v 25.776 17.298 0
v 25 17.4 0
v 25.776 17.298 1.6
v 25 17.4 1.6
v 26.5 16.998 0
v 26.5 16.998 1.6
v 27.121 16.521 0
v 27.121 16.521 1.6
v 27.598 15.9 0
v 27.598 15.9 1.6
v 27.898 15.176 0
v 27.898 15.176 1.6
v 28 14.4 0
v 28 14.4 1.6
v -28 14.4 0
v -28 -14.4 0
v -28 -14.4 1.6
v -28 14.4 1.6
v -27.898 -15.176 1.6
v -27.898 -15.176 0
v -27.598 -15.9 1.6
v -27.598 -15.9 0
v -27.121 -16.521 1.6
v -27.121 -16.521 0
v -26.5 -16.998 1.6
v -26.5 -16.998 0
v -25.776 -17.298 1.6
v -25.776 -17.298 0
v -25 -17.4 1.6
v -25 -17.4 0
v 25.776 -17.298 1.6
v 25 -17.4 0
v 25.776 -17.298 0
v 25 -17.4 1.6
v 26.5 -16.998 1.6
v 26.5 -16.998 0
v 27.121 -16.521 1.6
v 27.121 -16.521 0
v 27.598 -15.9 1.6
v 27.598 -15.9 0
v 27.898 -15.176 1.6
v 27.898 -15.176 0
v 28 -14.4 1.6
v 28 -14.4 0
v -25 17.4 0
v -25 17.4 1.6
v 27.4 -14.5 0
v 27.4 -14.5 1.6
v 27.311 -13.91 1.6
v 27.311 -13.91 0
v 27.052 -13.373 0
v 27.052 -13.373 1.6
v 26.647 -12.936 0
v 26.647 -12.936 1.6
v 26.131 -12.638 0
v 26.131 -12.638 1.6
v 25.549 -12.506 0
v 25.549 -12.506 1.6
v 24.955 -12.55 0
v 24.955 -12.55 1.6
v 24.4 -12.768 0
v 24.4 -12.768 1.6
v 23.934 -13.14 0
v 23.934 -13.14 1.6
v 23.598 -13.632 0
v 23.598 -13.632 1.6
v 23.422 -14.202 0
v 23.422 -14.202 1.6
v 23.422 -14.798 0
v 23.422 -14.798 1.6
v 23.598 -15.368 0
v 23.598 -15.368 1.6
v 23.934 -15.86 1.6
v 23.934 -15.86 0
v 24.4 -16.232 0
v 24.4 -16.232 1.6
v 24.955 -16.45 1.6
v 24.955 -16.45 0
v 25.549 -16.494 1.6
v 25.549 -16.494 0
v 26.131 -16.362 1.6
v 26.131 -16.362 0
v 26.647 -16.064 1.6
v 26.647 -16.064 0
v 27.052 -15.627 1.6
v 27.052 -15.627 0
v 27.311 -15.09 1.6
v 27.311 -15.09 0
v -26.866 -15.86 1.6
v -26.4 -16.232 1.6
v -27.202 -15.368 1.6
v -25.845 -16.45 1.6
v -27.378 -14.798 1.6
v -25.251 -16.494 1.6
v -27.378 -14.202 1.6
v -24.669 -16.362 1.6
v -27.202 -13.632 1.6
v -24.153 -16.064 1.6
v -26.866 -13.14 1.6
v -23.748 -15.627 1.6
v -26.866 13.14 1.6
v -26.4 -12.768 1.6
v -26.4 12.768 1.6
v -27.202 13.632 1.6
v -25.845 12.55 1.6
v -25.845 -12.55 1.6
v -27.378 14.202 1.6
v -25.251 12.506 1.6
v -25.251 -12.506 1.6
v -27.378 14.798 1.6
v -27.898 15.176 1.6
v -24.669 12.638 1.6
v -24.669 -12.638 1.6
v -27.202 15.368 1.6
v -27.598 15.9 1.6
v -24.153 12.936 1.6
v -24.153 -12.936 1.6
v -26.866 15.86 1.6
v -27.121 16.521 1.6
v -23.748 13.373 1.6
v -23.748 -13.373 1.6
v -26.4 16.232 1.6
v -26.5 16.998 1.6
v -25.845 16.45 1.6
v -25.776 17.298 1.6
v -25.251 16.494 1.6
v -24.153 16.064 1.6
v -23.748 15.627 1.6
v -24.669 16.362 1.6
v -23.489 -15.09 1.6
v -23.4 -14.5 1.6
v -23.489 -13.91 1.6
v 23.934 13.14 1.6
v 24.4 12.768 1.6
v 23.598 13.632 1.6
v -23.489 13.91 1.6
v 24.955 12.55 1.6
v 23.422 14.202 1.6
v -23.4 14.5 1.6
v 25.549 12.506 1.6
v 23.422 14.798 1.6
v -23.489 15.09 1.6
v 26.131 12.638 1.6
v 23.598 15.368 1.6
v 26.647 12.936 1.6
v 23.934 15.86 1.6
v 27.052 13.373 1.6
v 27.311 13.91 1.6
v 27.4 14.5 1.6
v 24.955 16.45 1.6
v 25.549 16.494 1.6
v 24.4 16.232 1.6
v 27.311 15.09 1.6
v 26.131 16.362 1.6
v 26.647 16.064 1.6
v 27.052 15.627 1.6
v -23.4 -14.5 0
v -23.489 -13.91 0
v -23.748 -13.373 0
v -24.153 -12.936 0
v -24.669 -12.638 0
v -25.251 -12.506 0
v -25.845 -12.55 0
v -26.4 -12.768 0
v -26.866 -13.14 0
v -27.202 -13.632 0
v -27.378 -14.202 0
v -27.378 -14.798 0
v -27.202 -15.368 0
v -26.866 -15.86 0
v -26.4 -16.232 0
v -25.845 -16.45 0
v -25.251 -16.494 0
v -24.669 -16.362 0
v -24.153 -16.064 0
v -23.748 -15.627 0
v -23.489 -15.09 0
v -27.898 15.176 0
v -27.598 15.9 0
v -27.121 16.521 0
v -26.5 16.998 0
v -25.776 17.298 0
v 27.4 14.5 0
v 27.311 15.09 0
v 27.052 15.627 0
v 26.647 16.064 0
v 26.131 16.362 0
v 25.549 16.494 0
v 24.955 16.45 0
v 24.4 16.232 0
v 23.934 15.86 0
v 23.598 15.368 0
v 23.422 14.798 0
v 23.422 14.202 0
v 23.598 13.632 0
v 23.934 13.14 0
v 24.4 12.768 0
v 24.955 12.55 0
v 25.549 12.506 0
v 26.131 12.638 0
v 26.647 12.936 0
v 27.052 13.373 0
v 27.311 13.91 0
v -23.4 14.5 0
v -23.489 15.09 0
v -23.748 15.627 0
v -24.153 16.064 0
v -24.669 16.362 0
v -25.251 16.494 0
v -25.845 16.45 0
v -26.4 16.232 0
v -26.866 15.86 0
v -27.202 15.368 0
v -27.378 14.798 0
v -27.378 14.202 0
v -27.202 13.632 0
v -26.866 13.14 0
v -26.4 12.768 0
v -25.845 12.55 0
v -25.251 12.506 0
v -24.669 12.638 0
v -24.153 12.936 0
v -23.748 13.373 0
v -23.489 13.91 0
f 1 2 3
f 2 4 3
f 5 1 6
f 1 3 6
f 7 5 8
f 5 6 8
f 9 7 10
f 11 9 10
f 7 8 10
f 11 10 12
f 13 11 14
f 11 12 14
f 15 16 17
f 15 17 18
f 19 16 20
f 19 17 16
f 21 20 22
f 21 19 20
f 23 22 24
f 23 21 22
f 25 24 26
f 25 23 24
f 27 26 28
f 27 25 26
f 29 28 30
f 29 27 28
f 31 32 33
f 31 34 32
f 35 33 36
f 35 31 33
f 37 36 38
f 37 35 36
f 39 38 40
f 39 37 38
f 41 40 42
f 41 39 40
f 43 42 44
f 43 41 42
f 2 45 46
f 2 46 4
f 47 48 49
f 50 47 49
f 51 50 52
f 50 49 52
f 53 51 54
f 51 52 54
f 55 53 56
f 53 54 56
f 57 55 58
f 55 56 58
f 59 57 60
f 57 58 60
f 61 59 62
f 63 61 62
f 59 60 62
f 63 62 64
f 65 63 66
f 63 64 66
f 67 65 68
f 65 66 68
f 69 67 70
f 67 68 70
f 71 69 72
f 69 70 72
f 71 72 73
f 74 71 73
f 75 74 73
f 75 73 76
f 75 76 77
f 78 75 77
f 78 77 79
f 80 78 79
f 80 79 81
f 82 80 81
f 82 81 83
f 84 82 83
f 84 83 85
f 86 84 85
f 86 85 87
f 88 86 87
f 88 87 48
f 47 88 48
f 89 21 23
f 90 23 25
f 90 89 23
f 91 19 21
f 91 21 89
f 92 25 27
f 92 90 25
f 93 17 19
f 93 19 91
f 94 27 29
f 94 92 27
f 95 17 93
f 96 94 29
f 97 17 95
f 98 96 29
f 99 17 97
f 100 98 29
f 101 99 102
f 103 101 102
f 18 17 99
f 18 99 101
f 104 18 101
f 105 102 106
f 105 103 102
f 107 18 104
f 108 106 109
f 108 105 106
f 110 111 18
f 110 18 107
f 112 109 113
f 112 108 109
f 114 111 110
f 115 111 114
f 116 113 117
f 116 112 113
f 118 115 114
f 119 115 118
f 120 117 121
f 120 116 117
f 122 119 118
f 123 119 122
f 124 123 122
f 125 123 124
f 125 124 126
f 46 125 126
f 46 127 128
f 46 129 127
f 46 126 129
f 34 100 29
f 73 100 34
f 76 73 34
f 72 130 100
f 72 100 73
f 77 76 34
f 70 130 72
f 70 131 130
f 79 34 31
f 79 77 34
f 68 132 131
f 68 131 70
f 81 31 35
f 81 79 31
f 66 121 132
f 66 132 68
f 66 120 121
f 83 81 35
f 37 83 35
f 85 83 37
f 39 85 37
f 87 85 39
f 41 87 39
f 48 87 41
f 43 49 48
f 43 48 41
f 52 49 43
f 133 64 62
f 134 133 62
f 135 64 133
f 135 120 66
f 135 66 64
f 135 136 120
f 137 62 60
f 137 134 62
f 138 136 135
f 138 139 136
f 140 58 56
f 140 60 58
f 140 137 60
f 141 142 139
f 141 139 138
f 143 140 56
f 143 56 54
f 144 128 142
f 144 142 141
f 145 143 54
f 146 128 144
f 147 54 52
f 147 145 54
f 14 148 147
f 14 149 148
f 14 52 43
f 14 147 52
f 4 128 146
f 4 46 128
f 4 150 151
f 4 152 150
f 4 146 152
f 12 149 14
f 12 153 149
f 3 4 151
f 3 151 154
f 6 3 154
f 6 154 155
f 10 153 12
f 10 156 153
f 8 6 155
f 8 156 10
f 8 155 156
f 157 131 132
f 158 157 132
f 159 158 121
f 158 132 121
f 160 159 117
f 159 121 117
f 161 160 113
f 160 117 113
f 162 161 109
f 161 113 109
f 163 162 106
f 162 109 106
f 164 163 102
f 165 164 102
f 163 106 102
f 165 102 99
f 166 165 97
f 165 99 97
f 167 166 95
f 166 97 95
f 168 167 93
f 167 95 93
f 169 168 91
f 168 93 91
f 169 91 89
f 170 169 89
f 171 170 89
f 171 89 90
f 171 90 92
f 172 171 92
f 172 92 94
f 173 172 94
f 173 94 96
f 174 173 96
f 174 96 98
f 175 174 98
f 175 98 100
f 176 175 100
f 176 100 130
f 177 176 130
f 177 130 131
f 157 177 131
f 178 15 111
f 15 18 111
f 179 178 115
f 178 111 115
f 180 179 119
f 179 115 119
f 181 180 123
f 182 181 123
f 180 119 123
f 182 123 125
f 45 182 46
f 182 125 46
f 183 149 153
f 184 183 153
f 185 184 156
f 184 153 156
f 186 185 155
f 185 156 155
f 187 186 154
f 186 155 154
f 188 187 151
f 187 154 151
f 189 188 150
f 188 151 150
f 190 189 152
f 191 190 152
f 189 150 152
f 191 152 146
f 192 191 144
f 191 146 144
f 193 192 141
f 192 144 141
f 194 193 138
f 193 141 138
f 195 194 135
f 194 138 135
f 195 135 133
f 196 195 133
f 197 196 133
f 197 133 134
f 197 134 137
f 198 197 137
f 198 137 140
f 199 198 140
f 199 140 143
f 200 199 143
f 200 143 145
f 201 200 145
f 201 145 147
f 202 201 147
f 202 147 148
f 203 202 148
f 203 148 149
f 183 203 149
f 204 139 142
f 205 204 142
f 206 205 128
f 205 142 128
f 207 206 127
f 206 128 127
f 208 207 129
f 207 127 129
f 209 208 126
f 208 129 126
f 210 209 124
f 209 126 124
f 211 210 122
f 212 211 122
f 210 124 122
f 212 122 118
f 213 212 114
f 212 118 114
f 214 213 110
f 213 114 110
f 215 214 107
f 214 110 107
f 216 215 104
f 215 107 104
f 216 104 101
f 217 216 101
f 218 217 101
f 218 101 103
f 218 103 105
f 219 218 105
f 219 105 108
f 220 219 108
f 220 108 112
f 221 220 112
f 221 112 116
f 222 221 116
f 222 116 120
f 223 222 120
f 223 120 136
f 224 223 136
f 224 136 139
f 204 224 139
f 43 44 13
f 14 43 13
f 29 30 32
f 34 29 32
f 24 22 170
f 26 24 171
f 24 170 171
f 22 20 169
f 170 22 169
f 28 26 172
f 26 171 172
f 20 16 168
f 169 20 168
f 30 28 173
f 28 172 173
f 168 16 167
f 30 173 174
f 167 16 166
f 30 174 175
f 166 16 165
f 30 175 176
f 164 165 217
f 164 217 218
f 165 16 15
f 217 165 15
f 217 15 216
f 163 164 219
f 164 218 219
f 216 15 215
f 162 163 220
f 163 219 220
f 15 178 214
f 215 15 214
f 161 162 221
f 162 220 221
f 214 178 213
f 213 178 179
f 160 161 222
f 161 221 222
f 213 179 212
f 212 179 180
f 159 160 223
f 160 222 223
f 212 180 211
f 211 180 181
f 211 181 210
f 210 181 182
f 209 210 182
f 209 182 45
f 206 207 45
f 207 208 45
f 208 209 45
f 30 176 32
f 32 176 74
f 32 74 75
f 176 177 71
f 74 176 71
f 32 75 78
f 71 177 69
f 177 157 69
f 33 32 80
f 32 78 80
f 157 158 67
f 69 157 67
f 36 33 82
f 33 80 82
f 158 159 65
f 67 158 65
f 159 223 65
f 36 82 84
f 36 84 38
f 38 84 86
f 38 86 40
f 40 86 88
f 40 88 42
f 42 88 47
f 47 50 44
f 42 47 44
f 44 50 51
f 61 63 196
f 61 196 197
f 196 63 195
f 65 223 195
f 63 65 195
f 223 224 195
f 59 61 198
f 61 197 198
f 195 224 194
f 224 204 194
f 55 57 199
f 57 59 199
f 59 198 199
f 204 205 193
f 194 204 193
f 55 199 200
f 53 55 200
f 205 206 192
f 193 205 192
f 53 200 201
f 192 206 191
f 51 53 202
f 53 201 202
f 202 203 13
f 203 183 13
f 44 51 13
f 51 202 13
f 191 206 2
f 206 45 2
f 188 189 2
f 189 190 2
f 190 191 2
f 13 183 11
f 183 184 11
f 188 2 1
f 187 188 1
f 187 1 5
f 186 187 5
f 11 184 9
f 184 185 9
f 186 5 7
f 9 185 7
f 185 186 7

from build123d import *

# Parameters (mm, degrees)
SKETCH_W     = 56
SKETCH_H     = 34.8
PAD_DEPTH    = 1.6
SKETCH003_R  = 2
POCKET_DEPTH = 1.601
FILLET_R     = 3


with BuildPart() as part:
    # Sketch → Pad (new body)
    with BuildSketch(Plane.XY):
        Rectangle(SKETCH_W, SKETCH_H)
    extrude(amount=PAD_DEPTH)

    # Sketch003 → Pocket (cut, through all)
    with BuildSketch(Plane.XY.offset(1.6)):
        with Locations((-25.4, -14.5)):
            Circle(SKETCH003_R)
        with Locations((-25.4, 14.5)):
            Circle(SKETCH003_R)
        with Locations((25.4, 14.5)):
            Circle(SKETCH003_R)
        with Locations((25.4, -14.5)):
            Circle(SKETCH003_R)
    extrude(amount=-POCKET_DEPTH, mode=Mode.SUBTRACT)

    # Fillet
    fillet_edges = [part.edges().sort_by_distance(p)[0] for p in [
        (-28, -17.4, 0.8),
        (28, -17.4, 0.8),
        (28, 17.4, 0.8),
        (-28, 17.4, 0.8),
    ]]
    fillet(fillet_edges, radius=FILLET_R)


solid = part.part
